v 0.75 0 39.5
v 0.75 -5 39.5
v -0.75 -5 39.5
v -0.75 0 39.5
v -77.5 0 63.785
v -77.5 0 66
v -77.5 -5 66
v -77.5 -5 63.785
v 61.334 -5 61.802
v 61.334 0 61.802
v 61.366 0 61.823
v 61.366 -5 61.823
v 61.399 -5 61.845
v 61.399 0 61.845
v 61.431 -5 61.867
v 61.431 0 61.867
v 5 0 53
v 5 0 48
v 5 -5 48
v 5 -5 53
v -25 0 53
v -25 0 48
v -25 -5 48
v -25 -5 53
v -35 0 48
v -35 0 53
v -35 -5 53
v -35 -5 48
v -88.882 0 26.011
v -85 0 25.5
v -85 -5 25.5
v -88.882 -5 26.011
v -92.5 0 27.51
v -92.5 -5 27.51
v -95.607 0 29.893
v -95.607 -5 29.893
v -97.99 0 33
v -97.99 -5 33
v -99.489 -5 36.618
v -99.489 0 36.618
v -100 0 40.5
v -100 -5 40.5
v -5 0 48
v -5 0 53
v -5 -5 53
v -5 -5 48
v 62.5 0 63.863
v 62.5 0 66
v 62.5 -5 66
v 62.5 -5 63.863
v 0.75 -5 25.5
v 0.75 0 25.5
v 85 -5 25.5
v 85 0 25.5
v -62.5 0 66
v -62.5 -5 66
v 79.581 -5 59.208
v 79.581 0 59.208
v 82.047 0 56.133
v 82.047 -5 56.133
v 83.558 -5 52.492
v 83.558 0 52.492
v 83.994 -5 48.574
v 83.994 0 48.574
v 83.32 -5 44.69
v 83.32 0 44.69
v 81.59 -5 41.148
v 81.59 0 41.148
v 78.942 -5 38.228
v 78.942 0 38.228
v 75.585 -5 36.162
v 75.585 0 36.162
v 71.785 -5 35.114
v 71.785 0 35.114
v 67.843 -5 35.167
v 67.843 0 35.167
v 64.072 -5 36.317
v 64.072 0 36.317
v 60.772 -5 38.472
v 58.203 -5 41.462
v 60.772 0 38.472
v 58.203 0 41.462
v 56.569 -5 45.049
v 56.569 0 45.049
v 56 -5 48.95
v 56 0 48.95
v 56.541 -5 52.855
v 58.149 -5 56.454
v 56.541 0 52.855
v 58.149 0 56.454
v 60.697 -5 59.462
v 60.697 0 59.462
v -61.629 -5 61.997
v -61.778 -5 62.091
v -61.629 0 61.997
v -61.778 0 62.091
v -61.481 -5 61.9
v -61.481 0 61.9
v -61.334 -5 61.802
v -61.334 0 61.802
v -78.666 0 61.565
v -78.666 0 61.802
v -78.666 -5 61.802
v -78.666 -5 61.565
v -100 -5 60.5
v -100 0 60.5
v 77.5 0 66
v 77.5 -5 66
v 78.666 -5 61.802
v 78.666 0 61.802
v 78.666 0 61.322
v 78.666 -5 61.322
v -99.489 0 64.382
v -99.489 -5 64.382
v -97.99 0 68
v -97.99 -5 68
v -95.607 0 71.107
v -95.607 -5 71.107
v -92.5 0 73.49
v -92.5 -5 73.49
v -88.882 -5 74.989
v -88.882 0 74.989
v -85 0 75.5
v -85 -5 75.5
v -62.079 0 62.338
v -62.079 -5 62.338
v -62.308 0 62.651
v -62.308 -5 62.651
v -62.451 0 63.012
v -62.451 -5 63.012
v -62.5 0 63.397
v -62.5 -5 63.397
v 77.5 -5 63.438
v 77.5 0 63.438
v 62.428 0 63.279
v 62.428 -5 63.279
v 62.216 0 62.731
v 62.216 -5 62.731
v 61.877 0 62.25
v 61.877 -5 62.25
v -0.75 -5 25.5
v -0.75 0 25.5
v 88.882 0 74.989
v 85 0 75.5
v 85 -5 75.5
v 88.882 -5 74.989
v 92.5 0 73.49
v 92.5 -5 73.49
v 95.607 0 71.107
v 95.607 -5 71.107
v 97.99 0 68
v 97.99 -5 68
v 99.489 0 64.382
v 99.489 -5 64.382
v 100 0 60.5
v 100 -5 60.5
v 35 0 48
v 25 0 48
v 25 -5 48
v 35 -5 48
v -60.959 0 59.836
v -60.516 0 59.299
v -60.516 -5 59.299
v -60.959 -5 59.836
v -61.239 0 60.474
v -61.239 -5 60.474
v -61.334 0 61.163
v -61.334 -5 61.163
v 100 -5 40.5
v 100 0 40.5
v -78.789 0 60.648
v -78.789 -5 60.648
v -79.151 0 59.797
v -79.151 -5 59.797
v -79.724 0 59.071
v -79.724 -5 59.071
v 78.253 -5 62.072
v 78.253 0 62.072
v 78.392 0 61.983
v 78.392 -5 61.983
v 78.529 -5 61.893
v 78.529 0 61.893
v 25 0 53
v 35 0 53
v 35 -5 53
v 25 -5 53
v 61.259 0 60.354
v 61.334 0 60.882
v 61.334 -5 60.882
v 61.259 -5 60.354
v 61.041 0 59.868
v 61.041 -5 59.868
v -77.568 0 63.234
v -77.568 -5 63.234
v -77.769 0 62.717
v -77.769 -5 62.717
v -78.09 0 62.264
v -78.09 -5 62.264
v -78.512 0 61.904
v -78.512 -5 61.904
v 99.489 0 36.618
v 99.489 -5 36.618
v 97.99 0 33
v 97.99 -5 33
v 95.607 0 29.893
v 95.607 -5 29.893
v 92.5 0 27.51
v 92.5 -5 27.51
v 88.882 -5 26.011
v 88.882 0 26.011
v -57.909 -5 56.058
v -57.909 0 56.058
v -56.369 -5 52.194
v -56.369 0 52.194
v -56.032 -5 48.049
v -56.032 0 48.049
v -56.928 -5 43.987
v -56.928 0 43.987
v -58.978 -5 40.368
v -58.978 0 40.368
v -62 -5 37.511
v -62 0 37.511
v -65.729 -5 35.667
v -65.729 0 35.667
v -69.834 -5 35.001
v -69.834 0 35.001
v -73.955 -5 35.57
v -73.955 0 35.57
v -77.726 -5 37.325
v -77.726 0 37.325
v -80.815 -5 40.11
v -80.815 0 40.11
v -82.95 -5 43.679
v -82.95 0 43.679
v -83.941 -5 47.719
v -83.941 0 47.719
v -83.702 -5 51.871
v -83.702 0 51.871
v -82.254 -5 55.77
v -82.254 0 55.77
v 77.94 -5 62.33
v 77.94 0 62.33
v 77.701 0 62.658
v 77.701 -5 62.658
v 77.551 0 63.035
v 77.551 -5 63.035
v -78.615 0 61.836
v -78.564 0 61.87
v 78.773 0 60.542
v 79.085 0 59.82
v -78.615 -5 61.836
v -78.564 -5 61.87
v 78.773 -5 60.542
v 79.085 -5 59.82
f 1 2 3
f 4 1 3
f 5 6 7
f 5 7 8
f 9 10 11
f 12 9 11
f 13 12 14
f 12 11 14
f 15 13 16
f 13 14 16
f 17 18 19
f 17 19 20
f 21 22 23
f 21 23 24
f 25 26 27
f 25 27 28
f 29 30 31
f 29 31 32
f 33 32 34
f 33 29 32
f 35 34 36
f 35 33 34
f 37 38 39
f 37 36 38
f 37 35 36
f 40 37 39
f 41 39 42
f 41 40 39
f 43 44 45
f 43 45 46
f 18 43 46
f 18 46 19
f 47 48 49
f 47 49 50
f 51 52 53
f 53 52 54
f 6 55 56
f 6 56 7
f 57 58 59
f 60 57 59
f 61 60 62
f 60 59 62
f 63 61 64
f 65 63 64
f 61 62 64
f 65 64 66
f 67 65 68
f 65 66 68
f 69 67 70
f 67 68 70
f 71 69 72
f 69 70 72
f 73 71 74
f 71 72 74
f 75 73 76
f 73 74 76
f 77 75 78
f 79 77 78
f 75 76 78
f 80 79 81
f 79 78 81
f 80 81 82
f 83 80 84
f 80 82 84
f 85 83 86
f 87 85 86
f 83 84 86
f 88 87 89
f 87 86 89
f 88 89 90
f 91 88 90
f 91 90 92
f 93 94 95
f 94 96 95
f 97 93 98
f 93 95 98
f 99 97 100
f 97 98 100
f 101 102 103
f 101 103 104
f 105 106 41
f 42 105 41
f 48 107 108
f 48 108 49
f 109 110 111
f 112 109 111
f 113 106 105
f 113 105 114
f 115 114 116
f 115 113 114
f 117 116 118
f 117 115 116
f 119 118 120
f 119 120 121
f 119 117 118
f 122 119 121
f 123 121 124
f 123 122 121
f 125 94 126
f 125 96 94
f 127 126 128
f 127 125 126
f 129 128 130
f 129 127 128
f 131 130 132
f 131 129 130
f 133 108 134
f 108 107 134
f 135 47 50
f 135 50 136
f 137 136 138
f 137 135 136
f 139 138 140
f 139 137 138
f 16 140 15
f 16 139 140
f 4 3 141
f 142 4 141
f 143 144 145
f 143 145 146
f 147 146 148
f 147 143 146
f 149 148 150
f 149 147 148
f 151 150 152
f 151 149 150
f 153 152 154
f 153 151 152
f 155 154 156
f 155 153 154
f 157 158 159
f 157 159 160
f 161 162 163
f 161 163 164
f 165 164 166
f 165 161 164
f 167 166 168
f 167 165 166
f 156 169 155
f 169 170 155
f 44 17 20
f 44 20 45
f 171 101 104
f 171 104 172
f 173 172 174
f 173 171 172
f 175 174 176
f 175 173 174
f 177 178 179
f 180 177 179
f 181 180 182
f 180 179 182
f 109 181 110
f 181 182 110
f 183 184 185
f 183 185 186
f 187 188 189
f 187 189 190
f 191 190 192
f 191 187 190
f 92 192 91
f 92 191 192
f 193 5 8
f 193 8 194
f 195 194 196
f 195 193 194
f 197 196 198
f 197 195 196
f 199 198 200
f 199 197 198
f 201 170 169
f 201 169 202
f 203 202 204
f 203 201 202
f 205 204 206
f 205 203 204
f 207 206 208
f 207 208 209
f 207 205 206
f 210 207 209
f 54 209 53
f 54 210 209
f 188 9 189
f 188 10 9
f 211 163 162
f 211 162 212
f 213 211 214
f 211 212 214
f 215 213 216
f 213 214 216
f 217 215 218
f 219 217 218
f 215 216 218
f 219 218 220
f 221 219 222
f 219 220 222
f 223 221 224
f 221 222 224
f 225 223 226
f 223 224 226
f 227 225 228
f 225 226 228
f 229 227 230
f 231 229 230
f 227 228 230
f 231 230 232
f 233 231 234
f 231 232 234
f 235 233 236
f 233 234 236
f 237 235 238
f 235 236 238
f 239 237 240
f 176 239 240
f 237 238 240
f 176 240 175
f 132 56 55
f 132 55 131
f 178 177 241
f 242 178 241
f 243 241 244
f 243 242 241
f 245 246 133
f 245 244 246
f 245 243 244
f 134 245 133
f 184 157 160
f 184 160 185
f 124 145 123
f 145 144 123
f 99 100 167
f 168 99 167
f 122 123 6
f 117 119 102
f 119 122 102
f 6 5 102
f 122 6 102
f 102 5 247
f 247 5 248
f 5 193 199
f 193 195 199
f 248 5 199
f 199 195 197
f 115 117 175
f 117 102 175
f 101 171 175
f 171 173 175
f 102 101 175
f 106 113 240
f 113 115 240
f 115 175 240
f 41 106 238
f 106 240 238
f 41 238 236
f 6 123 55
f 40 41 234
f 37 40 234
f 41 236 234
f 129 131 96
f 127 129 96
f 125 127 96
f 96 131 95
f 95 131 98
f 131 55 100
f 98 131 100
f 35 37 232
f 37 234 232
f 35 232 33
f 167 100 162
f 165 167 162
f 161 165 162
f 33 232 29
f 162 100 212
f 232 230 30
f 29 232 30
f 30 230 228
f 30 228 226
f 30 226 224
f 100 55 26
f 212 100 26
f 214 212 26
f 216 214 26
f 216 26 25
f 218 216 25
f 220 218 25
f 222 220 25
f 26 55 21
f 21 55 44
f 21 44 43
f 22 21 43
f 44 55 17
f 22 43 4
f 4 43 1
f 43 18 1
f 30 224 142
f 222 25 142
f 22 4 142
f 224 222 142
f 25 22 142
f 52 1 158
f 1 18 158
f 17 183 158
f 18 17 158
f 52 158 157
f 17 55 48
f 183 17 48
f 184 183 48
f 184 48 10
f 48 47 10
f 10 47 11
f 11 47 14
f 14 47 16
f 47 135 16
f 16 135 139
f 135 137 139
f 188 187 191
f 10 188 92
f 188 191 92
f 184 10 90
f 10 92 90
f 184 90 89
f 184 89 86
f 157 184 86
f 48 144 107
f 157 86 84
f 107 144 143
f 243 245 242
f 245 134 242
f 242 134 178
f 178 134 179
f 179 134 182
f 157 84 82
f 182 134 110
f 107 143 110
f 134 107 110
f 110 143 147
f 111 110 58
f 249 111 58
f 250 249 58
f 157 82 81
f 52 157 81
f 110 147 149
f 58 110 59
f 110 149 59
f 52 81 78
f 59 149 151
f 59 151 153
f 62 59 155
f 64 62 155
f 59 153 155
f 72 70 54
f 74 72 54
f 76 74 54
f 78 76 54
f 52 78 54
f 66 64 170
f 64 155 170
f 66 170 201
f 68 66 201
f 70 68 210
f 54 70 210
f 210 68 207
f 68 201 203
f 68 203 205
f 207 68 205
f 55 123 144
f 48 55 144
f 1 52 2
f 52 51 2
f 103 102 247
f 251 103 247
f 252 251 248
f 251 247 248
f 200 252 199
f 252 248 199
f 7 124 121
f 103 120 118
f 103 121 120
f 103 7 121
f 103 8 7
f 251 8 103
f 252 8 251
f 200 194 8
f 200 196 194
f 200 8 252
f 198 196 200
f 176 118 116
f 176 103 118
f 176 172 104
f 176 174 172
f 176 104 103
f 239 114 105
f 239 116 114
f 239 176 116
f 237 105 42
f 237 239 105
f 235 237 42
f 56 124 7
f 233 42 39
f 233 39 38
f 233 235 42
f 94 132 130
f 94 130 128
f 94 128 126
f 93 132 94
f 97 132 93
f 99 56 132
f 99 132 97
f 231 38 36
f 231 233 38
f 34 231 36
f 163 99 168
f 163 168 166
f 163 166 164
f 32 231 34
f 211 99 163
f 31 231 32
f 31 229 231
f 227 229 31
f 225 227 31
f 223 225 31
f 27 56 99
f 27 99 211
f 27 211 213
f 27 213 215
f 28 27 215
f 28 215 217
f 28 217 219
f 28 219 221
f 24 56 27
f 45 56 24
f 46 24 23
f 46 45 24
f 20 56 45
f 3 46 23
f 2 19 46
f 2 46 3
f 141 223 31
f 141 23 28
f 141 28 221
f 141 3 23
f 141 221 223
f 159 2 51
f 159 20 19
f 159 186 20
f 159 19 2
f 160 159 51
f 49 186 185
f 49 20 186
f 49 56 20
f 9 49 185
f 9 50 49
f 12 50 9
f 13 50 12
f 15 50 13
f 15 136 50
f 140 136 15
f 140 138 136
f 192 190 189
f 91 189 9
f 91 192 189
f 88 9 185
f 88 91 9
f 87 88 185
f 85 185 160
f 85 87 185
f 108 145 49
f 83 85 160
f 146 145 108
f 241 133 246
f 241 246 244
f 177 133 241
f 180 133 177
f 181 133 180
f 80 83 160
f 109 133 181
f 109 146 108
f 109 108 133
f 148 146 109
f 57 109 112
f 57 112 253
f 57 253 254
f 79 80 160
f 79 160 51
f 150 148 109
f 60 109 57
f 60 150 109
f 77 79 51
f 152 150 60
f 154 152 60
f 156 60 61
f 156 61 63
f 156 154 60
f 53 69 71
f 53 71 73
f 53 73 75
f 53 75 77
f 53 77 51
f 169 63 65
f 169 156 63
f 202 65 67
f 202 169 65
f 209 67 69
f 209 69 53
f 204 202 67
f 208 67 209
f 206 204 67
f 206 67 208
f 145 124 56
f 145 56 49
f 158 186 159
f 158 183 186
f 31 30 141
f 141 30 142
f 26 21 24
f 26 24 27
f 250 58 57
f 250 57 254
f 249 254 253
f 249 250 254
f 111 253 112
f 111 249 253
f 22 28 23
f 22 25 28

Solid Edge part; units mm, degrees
sketch "Sketch1" plane through (0, 0, 0) normal (0, -1, 0) x (1, 0, 0)
  line L0 (85, 75.5) -> (-85, 75.5)
  arc A0 (-100, 60.5) -> (-85, 75.5) centre (-85, 60.5) cw
  line L1 (-100, 60.5) -> (-100, 40.5)
  arc A1 (-100, 40.5) -> (-85, 25.5) centre (-85, 40.5) ccw
  line L2 (-85, 25.5) -> (85, 25.5)
  arc A2 (100, 40.5) -> (85, 25.5) centre (85, 40.5) cw
  line L3 (100, 40.5) -> (100, 60.5)
  arc A3 (85, 75.5) -> (100, 60.5) centre (85, 60.5) cw
  arc A4 (-62.5, 63.3967) -> (-61.7784, 62.0914) centre (-60.9587, 63.3967) ccw
  arc A5 (-61.7784, 62.0914) -> (-61.3341, 61.8017) centre (-70, 49) cw
  line L4 (-61.3341, 61.8017) -> (-61.3341, 61.1633)
  arc A6 (-61.3341, 61.1633) -> (-60.5164, 59.2986) centre (-58.7992, 61.1633) ccw
  arc A7 (-60.5164, 59.2986) -> (-79.7245, 59.0715) centre (-70, 49) cw
  arc A8 (-78.6659, 61.5651) -> (-79.7245, 59.0715) centre (-82.1323, 61.5651) cw
  line L5 (-78.6659, 61.8017) -> (-78.6659, 61.5651)
  arc A9 (-78.6659, 61.8017) -> (-78.5124, 61.9043) centre (-70, 49) cw
  arc A10 (-77.5, 63.7849) -> (-78.5124, 61.9043) centre (-79.7529, 63.7849) cw
  line L6 (-77.5, 66) -> (-77.5, 63.7849)
  line L7 (-69.9997, 66) -> (-77.5, 66)
  line L8 (-62.5, 66) -> (-69.9997, 66)
  line L9 (-62.5, 66) -> (-62.5, 63.3967)
  arc A11 (78.6659, 61.322) -> (79.581, 59.208) centre (81.5651, 61.322) ccw
  arc A12 (79.581, 59.208) -> (60.6967, 59.4617) centre (70, 49) cw
  arc A13 (61.3341, 60.8816) -> (60.6967, 59.4617) centre (59.434, 60.8816) cw
  line L10 (61.3341, 61.8017) -> (61.3341, 60.8816)
  arc A14 (61.3341, 61.8017) -> (61.4312, 61.8669) centre (70, 49) cw
  arc A15 (62.5, 63.8627) -> (61.4312, 61.8669) centre (60.1021, 63.8627) cw
  line L11 (62.5, 66) -> (62.5, 63.8627)
  line L12 (70, 66) -> (62.5, 66)
  line L13 (77.5, 66) -> (70, 66)
  line L14 (77.5, 66) -> (77.5, 63.4378)
  arc A16 (77.5, 63.4378) -> (78.2532, 62.0716) centre (79.1158, 63.4378) ccw
  arc A17 (78.2532, 62.0716) -> (78.6659, 61.8017) centre (70, 49) cw
  line L15 (78.6659, 61.8017) -> (78.6659, 61.322)
  line L16 (35, 48) -> (35, 53)
  line L17 (35, 53) -> (25, 53)
  line L18 (25, 53) -> (25, 48)
  line L19 (25, 48) -> (35, 48)
  line L20 (-5, 48) -> (5, 48)
  line L21 (5, 48) -> (5, 53)
  line L22 (5, 53) -> (-5, 53)
  line L23 (-5, 53) -> (-5, 48)
  line L24 (-25, 48) -> (-25, 53)
  line L25 (-25, 53) -> (-35, 53)
  line L26 (-35, 53) -> (-35, 48)
  line L27 (-35, 48) -> (-25, 48)
  dimension "D1" = 9.7248
extrude "Protrusion1" add sketch "Sketch1" along normal blind 5
sketch "Sketch2" plane through (0, -5, 50.5) normal (0, -1, 0) x (1, 0, 0)
  line L0 (0.75, -25) -> (0.75, -11)
  line L1 (0.75, -11) -> (-0.75, -11)
  line L2 (-0.75, -11) -> (-0.75, -25)
  line L3 (0.75, -25) -> (-0.75, -25)
extrude "Cutout1" cut sketch "Sketch2" against normal blind 19.8295
